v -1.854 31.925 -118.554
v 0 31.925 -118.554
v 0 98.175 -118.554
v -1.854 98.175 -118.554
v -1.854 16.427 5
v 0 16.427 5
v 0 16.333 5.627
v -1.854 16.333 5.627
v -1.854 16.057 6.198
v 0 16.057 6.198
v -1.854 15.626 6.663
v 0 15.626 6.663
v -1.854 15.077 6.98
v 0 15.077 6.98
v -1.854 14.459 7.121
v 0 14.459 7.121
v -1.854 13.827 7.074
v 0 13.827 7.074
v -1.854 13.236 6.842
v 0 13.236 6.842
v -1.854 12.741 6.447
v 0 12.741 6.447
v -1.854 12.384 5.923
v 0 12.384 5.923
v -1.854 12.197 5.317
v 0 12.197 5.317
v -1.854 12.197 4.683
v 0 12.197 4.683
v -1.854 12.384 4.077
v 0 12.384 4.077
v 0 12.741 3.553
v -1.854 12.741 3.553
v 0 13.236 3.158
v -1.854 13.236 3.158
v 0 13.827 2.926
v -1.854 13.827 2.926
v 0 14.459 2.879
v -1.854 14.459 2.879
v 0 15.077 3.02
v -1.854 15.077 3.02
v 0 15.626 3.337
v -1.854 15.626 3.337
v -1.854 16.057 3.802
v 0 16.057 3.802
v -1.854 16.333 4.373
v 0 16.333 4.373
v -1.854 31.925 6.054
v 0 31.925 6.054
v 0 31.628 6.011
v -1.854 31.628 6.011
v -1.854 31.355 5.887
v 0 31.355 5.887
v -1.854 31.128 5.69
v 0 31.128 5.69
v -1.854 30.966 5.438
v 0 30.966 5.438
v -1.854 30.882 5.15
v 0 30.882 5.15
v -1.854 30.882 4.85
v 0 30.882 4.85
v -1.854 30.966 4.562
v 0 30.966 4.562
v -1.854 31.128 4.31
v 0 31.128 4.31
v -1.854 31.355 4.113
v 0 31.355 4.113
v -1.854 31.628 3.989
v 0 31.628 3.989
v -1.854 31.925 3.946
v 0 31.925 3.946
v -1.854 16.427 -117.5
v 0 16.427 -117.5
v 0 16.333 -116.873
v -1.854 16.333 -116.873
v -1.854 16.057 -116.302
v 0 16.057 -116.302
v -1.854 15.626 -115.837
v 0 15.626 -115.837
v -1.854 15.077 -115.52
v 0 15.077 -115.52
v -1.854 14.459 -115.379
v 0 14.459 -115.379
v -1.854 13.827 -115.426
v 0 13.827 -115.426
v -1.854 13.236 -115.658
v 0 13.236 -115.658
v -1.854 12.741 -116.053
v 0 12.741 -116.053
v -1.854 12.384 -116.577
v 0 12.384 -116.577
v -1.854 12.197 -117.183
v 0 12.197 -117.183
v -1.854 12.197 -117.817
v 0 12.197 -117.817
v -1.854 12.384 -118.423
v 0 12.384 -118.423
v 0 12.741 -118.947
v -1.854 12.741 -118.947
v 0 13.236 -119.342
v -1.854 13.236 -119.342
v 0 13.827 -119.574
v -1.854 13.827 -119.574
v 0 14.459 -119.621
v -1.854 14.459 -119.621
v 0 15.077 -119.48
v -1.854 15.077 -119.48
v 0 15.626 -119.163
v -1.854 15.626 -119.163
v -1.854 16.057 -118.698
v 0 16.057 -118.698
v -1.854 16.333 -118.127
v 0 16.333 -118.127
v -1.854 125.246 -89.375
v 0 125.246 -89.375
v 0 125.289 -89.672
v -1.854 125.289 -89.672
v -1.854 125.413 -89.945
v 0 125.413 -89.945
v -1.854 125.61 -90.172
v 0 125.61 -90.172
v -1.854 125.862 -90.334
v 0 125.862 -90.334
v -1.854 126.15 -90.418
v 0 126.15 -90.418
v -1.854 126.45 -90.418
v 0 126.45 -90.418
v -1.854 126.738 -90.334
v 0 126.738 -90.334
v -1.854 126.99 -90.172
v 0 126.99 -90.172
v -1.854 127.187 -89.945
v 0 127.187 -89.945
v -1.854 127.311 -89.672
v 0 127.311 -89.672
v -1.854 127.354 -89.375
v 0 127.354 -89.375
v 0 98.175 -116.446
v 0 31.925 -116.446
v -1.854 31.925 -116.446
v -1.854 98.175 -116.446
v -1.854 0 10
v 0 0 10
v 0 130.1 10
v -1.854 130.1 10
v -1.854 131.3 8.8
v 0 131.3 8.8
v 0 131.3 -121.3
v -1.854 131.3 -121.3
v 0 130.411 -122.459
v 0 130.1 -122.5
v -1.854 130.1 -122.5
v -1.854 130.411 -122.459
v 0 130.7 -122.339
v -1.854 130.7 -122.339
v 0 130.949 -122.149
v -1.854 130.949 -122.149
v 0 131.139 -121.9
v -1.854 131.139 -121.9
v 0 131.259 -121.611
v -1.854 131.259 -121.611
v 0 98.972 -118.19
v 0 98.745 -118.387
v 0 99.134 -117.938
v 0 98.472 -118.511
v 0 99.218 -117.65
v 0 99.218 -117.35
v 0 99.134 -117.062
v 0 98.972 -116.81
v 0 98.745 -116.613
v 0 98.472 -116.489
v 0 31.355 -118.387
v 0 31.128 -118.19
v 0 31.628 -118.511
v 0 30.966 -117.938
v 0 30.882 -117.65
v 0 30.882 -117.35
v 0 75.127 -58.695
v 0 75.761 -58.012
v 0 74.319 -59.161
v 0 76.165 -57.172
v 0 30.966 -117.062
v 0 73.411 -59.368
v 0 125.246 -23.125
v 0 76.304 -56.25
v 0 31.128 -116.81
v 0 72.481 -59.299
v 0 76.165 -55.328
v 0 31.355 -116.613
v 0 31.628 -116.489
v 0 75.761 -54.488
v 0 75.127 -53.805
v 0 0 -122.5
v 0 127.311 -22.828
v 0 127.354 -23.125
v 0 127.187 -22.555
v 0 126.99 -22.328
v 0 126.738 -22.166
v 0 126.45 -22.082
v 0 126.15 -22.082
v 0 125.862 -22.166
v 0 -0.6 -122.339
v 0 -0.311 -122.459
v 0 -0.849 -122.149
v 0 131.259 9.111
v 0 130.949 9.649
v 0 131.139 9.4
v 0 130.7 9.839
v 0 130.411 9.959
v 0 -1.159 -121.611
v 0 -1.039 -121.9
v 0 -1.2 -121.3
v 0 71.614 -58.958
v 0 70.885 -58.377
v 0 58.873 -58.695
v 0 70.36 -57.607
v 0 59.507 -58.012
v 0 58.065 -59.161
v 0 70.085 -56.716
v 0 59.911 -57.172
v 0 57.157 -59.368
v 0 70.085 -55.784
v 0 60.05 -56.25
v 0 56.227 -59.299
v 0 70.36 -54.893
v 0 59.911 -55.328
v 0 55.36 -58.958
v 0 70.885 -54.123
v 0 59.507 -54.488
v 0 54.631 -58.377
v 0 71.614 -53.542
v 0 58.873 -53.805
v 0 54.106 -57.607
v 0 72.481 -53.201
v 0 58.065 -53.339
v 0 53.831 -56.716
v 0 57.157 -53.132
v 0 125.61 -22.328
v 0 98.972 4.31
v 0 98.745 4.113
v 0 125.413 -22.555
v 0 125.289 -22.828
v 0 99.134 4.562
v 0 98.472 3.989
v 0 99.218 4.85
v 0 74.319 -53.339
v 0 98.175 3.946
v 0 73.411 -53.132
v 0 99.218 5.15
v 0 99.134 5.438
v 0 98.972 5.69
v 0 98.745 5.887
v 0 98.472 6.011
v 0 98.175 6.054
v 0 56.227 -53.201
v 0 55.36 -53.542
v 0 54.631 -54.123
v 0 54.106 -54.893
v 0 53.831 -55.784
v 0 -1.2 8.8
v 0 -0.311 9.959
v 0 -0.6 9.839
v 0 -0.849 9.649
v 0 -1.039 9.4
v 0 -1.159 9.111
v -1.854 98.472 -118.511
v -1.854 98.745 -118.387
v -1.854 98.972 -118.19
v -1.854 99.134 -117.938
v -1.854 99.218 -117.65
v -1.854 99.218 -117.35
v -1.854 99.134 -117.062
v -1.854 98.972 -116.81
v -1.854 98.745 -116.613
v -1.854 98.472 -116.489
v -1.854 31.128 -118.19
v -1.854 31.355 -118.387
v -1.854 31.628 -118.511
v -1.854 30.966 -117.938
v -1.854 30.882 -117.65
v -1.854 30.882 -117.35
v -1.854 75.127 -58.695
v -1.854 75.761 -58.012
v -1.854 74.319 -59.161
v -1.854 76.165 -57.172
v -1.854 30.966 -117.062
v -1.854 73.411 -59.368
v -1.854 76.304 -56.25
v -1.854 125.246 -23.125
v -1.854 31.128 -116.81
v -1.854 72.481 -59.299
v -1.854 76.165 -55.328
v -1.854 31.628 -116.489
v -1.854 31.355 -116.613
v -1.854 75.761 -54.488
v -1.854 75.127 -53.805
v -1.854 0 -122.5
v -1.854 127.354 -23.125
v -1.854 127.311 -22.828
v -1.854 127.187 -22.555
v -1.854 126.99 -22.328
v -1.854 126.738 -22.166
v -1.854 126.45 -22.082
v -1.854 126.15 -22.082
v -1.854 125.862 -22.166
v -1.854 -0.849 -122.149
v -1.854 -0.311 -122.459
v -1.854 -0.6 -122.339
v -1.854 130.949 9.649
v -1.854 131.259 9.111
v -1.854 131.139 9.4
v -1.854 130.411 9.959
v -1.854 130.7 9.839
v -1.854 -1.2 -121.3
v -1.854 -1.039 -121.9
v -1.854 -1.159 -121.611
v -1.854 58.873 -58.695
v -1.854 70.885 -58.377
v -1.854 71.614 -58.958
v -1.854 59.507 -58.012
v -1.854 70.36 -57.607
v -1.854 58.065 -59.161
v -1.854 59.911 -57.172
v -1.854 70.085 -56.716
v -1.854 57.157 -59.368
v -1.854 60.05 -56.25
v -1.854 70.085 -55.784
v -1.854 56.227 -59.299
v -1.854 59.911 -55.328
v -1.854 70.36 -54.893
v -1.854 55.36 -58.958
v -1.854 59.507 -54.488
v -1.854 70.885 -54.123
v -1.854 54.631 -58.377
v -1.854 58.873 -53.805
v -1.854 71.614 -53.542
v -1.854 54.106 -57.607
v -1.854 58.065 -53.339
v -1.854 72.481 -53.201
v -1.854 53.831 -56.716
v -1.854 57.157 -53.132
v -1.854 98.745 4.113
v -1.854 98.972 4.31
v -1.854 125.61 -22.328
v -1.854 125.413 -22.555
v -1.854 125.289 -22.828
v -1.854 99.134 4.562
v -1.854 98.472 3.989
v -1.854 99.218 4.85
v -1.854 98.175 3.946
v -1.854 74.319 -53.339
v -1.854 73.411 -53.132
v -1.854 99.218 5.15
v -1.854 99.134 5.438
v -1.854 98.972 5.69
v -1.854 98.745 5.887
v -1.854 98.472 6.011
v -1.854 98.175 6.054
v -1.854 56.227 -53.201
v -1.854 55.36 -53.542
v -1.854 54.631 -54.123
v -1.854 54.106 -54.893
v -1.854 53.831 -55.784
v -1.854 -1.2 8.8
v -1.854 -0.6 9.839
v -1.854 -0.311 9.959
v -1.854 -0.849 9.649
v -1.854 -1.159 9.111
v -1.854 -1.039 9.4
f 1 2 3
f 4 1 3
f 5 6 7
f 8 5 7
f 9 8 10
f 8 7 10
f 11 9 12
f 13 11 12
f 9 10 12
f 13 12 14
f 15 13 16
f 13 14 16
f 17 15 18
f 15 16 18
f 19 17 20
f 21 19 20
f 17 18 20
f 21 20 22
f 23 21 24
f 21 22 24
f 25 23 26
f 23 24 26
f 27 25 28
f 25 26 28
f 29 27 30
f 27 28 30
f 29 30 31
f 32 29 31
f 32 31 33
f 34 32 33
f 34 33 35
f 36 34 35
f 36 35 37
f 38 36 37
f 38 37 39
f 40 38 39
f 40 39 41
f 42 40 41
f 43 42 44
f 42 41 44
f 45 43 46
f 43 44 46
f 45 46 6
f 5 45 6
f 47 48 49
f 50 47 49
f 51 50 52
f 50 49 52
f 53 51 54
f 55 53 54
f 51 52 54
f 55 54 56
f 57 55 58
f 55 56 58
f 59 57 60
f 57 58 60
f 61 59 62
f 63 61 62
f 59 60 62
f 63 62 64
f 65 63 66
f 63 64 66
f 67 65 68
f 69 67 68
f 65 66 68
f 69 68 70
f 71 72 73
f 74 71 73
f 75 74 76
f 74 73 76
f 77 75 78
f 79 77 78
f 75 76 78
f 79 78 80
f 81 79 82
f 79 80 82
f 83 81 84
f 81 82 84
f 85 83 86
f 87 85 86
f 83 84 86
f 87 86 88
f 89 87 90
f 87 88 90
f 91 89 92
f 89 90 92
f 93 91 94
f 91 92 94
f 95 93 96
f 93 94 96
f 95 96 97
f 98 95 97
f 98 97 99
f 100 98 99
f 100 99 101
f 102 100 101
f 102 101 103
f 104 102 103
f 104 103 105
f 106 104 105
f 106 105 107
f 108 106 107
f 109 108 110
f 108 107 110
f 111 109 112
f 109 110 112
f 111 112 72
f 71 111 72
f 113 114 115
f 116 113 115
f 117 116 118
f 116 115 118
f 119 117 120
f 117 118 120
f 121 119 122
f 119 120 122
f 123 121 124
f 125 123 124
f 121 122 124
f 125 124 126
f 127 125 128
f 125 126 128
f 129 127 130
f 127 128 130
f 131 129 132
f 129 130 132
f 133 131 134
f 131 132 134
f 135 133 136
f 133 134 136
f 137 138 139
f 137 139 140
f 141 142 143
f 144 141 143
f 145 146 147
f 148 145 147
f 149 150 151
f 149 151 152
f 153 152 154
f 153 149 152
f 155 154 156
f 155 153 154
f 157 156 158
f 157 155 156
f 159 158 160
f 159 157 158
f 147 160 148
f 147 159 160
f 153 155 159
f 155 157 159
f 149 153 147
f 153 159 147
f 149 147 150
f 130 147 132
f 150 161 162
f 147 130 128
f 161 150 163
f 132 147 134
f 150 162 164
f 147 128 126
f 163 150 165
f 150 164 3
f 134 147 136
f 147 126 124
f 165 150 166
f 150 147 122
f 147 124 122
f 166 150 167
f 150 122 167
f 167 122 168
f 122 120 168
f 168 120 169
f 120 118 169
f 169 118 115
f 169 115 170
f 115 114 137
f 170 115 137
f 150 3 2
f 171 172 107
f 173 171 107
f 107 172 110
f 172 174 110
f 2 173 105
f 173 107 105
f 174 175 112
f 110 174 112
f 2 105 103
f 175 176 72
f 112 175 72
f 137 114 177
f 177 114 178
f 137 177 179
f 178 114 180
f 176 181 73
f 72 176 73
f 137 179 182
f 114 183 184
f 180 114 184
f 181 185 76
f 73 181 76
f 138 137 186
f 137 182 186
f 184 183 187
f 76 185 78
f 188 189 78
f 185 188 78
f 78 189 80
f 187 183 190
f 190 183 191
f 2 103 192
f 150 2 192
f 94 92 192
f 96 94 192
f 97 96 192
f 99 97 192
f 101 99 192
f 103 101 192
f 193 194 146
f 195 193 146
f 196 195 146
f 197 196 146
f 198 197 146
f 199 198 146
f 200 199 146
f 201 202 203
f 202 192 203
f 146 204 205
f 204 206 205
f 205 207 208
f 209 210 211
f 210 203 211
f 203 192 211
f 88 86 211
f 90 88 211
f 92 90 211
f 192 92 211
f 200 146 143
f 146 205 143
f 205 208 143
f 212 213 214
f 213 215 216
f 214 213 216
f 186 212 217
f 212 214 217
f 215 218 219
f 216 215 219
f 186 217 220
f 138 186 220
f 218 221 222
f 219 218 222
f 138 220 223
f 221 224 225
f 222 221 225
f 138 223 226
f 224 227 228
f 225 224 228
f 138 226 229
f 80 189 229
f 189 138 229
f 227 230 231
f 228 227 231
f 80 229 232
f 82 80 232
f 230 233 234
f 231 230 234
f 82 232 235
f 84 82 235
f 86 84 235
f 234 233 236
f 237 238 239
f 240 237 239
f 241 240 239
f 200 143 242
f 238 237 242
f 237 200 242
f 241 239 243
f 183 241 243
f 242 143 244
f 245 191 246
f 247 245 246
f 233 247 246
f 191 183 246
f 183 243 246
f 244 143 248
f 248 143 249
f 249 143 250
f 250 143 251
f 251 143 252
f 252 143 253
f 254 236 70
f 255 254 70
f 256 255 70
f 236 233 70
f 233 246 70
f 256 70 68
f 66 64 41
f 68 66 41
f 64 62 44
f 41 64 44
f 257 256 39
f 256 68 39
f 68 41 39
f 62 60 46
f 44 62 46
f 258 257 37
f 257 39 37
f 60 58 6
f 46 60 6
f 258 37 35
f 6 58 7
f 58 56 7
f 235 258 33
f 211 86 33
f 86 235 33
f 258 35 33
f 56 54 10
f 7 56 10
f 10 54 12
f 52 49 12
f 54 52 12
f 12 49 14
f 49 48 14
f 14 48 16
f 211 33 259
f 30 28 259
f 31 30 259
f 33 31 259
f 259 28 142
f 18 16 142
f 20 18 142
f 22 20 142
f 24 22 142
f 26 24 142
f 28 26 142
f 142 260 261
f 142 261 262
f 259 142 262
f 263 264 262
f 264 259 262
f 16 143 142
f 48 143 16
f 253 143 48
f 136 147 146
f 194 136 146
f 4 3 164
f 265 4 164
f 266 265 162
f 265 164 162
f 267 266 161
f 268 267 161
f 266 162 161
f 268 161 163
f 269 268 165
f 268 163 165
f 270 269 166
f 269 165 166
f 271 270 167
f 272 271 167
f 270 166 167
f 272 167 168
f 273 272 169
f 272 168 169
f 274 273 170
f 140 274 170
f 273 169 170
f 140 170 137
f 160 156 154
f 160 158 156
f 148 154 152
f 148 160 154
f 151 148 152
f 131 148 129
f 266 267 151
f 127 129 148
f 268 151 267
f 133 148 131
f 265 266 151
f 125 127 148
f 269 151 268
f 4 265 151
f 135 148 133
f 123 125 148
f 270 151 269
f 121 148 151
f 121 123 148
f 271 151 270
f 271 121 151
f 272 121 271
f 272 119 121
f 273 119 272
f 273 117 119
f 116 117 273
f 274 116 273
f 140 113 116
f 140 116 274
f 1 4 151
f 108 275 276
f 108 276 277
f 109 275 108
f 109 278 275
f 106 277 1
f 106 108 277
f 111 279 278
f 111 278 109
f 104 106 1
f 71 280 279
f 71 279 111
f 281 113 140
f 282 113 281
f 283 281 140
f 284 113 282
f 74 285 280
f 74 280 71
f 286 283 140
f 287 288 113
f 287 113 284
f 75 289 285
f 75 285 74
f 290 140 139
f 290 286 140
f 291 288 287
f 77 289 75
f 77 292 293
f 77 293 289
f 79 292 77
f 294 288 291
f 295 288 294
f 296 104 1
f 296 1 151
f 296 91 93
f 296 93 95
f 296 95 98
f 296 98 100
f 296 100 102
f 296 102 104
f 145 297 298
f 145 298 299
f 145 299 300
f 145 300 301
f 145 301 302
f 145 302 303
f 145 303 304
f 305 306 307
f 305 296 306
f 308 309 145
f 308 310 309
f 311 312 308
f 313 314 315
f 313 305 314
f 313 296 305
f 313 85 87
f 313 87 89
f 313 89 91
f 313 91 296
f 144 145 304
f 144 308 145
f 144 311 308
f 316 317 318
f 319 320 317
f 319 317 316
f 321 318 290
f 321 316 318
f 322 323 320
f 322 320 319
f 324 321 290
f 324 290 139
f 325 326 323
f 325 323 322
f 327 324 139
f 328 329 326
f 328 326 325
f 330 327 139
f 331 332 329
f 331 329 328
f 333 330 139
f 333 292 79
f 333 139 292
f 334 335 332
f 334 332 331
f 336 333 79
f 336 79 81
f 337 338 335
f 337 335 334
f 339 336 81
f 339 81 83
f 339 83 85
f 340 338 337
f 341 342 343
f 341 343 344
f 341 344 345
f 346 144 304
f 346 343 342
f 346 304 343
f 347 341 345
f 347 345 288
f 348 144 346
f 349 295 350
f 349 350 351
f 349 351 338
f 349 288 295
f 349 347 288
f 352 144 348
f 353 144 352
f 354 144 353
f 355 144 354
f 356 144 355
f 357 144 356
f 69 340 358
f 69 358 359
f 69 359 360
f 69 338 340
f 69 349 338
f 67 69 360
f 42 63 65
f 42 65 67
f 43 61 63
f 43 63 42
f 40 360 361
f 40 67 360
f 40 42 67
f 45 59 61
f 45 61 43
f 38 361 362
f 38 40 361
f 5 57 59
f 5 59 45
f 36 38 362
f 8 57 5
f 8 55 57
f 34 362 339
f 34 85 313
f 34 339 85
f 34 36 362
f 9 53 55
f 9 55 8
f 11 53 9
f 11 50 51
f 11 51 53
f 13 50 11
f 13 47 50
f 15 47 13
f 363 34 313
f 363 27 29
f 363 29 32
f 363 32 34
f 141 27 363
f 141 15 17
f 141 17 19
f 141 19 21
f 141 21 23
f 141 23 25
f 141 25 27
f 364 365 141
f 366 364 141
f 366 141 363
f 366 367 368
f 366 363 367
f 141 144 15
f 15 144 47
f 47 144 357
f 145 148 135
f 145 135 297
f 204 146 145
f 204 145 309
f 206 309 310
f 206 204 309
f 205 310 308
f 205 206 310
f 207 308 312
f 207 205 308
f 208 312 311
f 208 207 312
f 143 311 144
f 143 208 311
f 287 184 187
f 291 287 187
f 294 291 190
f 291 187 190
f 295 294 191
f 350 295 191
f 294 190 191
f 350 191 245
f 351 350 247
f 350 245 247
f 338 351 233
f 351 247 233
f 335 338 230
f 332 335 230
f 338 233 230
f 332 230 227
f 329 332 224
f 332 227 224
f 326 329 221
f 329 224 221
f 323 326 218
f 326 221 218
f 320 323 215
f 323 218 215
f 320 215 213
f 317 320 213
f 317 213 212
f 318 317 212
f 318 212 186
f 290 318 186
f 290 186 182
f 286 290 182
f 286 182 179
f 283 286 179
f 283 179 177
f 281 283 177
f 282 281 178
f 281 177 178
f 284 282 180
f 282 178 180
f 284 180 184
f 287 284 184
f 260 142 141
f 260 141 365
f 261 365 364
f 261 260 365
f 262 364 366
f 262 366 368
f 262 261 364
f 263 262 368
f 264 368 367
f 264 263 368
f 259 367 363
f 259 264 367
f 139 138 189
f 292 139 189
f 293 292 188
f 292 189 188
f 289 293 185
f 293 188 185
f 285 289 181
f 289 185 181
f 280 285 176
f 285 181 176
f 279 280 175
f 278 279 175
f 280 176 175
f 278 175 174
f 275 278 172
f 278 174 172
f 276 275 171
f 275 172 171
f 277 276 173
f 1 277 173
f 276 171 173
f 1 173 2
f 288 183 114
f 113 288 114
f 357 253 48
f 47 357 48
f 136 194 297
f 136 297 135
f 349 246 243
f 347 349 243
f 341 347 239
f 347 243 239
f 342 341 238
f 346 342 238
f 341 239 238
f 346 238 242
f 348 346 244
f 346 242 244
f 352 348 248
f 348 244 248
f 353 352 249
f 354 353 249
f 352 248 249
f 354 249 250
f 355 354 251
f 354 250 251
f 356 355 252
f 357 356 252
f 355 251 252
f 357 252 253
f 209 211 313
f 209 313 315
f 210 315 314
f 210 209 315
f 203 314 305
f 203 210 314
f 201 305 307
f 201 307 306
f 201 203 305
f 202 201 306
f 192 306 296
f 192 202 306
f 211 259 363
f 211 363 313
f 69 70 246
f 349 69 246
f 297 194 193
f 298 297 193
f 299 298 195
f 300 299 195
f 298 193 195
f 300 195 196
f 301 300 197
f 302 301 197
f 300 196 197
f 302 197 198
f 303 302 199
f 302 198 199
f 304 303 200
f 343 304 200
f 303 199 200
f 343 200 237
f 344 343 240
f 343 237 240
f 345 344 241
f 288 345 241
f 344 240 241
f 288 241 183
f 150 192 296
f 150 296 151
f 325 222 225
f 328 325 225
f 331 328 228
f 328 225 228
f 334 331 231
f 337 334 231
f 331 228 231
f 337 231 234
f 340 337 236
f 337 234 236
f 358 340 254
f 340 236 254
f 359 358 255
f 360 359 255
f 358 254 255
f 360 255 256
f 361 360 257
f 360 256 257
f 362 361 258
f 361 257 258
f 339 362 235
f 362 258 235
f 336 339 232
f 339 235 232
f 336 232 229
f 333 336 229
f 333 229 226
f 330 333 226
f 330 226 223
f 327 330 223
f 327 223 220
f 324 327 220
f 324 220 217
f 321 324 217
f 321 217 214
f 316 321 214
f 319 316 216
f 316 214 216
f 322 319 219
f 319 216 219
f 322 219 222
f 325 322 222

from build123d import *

# Parameters (mm, degrees)
SKETCH_R   = 2.127
SKETCH_R_2 = 3.127
PAD_DEPTH  = 1.8542


with BuildPart() as part:
    # Sketch (on Face33 of Binder001) → Pad (new body)
    with BuildSketch(Plane.YZ):
        with BuildLine():
            Line((0, 10), (130.1, 10))
            ThreePointArc((131.3, 8.8), (130.948528, 9.648528), (130.1, 10))
            Line((131.3, 8.8), (131.3, -121.3))
            ThreePointArc((130.1, -122.5), (130.948528, -122.148528), (131.3, -121.3))
            Line((0, -122.5), (130.1, -122.5))
            ThreePointArc((-1.2, -121.3), (-0.848528, -122.148528), (0, -122.5))
            Line((-1.2, 8.8), (-1.2, -121.3))
            ThreePointArc((0, 10), (-0.848528, 9.648528), (-1.2, 8.8))
        make_face()
        with Locations((14.3, 5)):
            Circle(SKETCH_R, mode=Mode.SUBTRACT)
        with Locations((14.3, -117.5)):
            Circle(SKETCH_R, mode=Mode.SUBTRACT)
        with Locations((56.923, -56.25)):
            Circle(SKETCH_R_2, mode=Mode.SUBTRACT)
        with Locations((73.177, -56.25)):
            Circle(SKETCH_R_2, mode=Mode.SUBTRACT)
        with BuildLine():
            Line((31.925, 3.9459), (98.175, 3.9459))
            ThreePointArc((98.175, 3.9459), (99.2291, 5), (98.175, 6.0541))
            Line((98.175, 6.0541), (31.925, 6.0541))
            ThreePointArc((31.925, 6.0541), (30.8709, 5), (31.925, 3.9459))
        make_face(mode=Mode.SUBTRACT)
        with BuildLine():
            ThreePointArc((127.3541, -23.125), (126.3, -22.0709), (125.2459, -23.125))
            Line((125.2459, -23.125), (125.2459, -89.375))
            ThreePointArc((125.2459, -89.375), (126.3, -90.4291), (127.3541, -89.375))
            Line((127.3541, -23.125), (127.3541, -89.375))
        make_face(mode=Mode.SUBTRACT)
        with BuildLine():
            ThreePointArc((31.925, -116.4459), (30.8709, -117.5), (31.925, -118.5541))
            Line((31.925, -118.5541), (98.175, -118.5541))
            ThreePointArc((98.175, -118.5541), (99.2291, -117.5), (98.175, -116.4459))
            Line((31.925, -116.4459), (98.175, -116.4459))
        make_face(mode=Mode.SUBTRACT)
    extrude(amount=-PAD_DEPTH)


solid = part.part
